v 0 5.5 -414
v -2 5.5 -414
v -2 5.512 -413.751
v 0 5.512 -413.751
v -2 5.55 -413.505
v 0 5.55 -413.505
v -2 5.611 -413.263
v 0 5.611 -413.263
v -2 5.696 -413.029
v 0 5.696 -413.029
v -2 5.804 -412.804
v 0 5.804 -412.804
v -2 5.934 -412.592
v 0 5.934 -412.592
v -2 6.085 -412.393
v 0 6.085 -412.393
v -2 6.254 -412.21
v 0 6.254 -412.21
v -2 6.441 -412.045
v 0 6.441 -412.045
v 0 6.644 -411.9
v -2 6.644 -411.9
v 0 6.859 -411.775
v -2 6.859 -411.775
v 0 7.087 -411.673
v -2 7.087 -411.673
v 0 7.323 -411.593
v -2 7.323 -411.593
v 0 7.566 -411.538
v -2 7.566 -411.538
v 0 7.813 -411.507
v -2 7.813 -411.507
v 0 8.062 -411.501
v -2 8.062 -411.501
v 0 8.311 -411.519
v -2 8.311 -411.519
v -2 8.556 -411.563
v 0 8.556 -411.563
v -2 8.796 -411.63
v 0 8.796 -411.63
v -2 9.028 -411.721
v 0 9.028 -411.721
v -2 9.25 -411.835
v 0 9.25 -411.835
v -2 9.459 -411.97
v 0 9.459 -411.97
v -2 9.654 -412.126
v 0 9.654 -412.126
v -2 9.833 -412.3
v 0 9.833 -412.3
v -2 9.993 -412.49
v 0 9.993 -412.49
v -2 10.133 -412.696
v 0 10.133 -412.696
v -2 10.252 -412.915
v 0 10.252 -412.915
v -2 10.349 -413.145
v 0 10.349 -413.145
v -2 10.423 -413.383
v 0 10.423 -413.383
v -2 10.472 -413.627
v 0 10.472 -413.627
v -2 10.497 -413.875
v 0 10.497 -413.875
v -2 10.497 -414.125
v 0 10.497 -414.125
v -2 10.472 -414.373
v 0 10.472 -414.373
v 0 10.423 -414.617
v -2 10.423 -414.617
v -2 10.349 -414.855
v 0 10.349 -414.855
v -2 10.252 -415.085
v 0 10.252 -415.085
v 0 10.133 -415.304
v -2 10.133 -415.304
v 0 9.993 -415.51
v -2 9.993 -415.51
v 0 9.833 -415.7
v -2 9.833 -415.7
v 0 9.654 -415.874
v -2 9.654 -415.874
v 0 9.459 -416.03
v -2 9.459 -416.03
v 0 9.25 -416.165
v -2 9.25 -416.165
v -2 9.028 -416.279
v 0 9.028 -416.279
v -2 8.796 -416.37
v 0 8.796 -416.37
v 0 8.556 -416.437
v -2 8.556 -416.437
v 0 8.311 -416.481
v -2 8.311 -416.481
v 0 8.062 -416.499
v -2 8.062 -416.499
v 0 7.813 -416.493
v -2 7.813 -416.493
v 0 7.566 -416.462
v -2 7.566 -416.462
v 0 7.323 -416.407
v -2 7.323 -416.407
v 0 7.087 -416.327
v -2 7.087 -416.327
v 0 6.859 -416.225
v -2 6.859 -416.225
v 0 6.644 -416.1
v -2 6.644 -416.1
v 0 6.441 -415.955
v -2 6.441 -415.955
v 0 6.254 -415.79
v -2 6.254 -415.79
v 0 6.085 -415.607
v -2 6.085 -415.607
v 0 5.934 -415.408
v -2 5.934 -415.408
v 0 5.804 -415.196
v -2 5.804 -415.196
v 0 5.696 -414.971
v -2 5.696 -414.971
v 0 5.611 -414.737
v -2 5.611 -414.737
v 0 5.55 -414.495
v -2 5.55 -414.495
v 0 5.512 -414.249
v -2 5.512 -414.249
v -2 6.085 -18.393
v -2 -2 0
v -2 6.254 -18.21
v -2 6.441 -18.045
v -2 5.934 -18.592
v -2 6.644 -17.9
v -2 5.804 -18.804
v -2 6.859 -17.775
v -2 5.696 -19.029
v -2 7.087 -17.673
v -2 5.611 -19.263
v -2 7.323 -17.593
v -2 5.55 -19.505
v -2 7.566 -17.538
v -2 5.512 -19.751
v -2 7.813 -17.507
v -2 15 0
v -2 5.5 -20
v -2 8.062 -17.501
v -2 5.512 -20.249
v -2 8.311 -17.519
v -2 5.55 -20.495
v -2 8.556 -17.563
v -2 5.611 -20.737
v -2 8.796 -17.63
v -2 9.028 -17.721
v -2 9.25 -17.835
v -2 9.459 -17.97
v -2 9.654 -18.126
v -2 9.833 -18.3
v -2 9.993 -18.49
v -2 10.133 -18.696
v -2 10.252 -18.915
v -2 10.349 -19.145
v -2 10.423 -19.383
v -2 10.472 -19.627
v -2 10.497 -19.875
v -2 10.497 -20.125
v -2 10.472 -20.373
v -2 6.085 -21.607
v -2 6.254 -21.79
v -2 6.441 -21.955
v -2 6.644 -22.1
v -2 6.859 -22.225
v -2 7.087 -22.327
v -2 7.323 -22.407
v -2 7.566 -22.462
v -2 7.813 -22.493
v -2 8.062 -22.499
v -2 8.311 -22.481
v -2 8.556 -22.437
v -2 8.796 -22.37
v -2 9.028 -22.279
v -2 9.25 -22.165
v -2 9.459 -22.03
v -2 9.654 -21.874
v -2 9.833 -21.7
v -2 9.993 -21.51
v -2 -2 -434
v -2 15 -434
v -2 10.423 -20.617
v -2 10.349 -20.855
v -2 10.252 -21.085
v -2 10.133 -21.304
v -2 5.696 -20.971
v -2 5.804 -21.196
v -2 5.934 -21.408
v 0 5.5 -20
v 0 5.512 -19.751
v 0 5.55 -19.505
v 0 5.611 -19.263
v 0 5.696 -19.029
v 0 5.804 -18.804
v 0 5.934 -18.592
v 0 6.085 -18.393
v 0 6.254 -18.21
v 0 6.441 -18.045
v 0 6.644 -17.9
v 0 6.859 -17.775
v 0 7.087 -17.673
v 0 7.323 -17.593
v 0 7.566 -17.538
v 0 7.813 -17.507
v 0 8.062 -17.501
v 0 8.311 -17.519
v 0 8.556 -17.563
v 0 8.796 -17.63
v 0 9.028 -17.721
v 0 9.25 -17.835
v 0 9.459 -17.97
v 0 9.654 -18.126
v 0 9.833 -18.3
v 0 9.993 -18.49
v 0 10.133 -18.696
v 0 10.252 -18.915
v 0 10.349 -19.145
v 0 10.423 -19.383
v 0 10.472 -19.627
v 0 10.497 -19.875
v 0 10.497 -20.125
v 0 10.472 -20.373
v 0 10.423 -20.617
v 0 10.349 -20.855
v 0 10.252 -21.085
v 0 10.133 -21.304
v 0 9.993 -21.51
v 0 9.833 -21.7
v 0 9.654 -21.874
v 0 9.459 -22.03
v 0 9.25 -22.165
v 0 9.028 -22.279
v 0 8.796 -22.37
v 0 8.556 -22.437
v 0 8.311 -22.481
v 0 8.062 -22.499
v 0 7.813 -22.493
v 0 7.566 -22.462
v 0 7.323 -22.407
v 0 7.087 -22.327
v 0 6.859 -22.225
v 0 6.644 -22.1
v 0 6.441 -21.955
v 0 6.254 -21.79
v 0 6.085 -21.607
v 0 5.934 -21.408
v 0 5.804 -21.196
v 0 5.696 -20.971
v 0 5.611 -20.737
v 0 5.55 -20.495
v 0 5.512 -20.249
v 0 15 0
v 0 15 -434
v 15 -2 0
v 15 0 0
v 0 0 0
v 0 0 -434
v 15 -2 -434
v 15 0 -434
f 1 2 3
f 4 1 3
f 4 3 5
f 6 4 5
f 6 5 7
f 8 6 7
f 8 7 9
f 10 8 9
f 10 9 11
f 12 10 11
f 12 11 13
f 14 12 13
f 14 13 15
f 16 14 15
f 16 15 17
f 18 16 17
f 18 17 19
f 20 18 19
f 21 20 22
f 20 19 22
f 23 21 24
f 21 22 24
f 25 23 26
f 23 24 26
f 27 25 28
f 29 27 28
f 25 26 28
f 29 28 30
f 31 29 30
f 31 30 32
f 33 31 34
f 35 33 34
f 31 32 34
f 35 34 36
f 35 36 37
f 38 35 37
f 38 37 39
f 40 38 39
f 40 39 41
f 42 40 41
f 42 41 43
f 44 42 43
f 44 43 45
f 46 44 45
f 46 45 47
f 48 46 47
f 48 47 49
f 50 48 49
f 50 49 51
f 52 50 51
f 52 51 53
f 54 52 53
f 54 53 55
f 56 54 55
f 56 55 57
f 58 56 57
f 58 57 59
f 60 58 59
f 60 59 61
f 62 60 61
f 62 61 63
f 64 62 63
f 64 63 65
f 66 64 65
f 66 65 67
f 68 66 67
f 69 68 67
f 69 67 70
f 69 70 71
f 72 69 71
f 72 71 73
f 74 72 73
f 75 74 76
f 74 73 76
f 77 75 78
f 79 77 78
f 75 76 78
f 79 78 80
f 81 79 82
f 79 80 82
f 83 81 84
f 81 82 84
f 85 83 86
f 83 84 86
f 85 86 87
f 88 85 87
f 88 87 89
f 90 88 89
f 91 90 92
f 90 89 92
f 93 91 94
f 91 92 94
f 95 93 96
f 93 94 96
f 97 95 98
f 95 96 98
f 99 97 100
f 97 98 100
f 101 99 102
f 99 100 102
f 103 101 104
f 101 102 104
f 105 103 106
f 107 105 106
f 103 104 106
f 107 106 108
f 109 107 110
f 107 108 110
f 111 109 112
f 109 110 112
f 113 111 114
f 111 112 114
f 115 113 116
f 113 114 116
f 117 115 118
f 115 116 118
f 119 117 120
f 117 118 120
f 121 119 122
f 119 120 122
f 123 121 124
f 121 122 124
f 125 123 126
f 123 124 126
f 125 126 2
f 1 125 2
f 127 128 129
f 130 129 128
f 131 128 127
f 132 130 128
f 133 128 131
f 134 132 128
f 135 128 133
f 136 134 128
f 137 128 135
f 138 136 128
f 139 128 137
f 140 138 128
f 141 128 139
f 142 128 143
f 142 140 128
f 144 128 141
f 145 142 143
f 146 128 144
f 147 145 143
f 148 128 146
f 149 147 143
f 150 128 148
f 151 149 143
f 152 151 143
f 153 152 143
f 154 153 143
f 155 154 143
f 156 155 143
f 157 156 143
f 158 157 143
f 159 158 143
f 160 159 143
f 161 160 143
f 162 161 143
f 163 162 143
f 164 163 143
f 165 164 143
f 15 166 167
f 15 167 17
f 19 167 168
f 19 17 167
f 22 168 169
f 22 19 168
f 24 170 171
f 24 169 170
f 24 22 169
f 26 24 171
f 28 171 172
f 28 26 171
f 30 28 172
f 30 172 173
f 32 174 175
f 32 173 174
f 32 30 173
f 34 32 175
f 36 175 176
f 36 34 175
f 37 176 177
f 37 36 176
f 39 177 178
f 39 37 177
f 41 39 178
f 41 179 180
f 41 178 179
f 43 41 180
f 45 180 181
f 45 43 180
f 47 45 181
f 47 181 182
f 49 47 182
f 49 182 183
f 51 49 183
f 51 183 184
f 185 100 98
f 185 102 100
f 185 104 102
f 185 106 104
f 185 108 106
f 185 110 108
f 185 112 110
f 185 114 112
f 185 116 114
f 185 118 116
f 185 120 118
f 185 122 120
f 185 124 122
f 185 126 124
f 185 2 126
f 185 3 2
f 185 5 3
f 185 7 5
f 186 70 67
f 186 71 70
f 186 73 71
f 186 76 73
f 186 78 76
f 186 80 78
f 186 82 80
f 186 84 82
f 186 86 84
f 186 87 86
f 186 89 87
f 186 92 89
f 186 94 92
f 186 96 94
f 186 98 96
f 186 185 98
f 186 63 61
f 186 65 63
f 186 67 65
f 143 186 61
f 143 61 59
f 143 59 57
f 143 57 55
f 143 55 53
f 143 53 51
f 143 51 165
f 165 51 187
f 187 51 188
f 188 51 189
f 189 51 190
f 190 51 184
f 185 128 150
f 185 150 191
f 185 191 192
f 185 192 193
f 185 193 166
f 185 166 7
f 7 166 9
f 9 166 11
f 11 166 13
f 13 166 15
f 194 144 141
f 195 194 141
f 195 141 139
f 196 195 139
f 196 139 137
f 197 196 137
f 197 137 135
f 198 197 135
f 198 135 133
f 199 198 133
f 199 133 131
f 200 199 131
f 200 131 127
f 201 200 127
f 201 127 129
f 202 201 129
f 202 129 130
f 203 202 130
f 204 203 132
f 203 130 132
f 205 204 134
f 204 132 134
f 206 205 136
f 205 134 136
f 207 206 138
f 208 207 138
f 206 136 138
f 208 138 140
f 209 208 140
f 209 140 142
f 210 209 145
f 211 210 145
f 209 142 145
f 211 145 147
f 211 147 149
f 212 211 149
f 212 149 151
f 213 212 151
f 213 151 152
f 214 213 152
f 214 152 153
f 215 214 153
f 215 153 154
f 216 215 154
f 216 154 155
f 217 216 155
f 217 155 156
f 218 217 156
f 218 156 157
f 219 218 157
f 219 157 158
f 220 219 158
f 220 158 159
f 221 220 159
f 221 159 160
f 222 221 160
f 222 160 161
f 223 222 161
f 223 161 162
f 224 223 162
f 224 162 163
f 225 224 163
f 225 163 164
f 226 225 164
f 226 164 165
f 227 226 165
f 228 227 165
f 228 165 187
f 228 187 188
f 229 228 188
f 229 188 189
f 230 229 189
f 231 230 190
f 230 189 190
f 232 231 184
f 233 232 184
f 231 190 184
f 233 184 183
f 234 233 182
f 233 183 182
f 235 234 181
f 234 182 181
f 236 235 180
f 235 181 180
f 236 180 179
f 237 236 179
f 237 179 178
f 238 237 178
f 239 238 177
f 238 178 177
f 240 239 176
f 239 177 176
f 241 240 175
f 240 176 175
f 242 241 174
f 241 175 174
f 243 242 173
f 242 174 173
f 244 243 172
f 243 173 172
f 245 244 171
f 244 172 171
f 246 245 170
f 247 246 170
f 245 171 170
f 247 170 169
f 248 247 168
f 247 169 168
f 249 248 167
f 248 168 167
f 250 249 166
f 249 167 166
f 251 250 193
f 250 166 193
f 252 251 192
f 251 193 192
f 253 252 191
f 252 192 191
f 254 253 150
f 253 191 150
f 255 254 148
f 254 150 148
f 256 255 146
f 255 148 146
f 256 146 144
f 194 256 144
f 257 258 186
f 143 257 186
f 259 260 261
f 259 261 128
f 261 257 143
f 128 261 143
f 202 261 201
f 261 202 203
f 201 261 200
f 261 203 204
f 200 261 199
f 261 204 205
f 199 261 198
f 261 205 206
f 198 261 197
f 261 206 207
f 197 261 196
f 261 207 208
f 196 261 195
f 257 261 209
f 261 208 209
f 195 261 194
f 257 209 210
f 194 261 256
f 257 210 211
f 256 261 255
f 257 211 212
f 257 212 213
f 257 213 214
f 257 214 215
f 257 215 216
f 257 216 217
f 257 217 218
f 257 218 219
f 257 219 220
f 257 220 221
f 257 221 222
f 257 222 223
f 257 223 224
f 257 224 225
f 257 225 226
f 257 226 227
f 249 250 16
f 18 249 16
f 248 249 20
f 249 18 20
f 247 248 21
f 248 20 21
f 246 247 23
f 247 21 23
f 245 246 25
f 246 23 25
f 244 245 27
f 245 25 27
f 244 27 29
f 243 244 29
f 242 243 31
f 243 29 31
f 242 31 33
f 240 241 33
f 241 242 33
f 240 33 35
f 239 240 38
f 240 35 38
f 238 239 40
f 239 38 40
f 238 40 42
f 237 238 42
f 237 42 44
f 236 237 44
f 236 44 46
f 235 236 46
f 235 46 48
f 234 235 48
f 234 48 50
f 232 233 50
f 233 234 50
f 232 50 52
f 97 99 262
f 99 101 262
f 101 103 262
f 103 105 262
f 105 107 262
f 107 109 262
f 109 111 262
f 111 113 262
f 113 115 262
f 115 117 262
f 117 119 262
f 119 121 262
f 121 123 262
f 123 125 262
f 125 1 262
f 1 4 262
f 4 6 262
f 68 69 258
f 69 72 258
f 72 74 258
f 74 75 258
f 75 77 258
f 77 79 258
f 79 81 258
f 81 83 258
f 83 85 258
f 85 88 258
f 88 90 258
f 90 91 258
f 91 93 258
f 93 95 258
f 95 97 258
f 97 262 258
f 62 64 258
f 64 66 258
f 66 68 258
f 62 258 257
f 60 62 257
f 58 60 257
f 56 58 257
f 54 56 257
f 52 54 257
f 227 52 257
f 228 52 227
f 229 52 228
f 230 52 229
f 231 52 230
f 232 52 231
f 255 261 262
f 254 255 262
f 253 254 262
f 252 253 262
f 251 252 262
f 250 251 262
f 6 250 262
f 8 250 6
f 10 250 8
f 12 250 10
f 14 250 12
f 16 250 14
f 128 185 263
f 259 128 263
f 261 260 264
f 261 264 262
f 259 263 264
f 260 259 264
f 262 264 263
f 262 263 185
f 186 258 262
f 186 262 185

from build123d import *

# Parameters (mm, degrees)
EXTRUDE_1_DEPTH     = 434
SKETCH_2_R          = 2.5
CUT_EXTRUDE_1_DEPTH = 435.453679925
SKETCH_3_W          = 2
SKETCH_3_H          = 2
EXTRUDE_2_DEPTH     = 434


with BuildPart() as part:
    # Эскиз1 → Бобышка-Вытянуть1 (new body)
    with BuildSketch(Plane.XY):
        Polygon((0, 0), (0, 13), (-2, 13), (-2, -2), (13, -2), (13, 0), align=None)
    extrude(amount=-EXTRUDE_1_DEPTH)

    # Эскиз2 → Вырез-Вытянуть1 (cut, through all)
    with BuildSketch(Plane.ZY.offset(2)):
        with Locations(Location((-20, 8, 0), (0, 0, 270))):
            Circle(SKETCH_2_R)
        with Locations(Location((-414, 8, 0), (0, 0, 270))):
            Circle(SKETCH_2_R)
    extrude(amount=-CUT_EXTRUDE_1_DEPTH, mode=Mode.SUBTRACT)

    # Эскиз3 → Бобышка-Вытянуть2 (add)
    with BuildSketch(Plane(origin=(0, 0, -434), x_dir=(-1, 0, 0), z_dir=(0, 0, -1))):
        with Locations((1, 14)):
            Rectangle(SKETCH_3_W, SKETCH_3_H)
        with Locations((-14, -1)):
            Rectangle(SKETCH_3_W, SKETCH_3_H)
    extrude(amount=-EXTRUDE_2_DEPTH)


solid = part.part
